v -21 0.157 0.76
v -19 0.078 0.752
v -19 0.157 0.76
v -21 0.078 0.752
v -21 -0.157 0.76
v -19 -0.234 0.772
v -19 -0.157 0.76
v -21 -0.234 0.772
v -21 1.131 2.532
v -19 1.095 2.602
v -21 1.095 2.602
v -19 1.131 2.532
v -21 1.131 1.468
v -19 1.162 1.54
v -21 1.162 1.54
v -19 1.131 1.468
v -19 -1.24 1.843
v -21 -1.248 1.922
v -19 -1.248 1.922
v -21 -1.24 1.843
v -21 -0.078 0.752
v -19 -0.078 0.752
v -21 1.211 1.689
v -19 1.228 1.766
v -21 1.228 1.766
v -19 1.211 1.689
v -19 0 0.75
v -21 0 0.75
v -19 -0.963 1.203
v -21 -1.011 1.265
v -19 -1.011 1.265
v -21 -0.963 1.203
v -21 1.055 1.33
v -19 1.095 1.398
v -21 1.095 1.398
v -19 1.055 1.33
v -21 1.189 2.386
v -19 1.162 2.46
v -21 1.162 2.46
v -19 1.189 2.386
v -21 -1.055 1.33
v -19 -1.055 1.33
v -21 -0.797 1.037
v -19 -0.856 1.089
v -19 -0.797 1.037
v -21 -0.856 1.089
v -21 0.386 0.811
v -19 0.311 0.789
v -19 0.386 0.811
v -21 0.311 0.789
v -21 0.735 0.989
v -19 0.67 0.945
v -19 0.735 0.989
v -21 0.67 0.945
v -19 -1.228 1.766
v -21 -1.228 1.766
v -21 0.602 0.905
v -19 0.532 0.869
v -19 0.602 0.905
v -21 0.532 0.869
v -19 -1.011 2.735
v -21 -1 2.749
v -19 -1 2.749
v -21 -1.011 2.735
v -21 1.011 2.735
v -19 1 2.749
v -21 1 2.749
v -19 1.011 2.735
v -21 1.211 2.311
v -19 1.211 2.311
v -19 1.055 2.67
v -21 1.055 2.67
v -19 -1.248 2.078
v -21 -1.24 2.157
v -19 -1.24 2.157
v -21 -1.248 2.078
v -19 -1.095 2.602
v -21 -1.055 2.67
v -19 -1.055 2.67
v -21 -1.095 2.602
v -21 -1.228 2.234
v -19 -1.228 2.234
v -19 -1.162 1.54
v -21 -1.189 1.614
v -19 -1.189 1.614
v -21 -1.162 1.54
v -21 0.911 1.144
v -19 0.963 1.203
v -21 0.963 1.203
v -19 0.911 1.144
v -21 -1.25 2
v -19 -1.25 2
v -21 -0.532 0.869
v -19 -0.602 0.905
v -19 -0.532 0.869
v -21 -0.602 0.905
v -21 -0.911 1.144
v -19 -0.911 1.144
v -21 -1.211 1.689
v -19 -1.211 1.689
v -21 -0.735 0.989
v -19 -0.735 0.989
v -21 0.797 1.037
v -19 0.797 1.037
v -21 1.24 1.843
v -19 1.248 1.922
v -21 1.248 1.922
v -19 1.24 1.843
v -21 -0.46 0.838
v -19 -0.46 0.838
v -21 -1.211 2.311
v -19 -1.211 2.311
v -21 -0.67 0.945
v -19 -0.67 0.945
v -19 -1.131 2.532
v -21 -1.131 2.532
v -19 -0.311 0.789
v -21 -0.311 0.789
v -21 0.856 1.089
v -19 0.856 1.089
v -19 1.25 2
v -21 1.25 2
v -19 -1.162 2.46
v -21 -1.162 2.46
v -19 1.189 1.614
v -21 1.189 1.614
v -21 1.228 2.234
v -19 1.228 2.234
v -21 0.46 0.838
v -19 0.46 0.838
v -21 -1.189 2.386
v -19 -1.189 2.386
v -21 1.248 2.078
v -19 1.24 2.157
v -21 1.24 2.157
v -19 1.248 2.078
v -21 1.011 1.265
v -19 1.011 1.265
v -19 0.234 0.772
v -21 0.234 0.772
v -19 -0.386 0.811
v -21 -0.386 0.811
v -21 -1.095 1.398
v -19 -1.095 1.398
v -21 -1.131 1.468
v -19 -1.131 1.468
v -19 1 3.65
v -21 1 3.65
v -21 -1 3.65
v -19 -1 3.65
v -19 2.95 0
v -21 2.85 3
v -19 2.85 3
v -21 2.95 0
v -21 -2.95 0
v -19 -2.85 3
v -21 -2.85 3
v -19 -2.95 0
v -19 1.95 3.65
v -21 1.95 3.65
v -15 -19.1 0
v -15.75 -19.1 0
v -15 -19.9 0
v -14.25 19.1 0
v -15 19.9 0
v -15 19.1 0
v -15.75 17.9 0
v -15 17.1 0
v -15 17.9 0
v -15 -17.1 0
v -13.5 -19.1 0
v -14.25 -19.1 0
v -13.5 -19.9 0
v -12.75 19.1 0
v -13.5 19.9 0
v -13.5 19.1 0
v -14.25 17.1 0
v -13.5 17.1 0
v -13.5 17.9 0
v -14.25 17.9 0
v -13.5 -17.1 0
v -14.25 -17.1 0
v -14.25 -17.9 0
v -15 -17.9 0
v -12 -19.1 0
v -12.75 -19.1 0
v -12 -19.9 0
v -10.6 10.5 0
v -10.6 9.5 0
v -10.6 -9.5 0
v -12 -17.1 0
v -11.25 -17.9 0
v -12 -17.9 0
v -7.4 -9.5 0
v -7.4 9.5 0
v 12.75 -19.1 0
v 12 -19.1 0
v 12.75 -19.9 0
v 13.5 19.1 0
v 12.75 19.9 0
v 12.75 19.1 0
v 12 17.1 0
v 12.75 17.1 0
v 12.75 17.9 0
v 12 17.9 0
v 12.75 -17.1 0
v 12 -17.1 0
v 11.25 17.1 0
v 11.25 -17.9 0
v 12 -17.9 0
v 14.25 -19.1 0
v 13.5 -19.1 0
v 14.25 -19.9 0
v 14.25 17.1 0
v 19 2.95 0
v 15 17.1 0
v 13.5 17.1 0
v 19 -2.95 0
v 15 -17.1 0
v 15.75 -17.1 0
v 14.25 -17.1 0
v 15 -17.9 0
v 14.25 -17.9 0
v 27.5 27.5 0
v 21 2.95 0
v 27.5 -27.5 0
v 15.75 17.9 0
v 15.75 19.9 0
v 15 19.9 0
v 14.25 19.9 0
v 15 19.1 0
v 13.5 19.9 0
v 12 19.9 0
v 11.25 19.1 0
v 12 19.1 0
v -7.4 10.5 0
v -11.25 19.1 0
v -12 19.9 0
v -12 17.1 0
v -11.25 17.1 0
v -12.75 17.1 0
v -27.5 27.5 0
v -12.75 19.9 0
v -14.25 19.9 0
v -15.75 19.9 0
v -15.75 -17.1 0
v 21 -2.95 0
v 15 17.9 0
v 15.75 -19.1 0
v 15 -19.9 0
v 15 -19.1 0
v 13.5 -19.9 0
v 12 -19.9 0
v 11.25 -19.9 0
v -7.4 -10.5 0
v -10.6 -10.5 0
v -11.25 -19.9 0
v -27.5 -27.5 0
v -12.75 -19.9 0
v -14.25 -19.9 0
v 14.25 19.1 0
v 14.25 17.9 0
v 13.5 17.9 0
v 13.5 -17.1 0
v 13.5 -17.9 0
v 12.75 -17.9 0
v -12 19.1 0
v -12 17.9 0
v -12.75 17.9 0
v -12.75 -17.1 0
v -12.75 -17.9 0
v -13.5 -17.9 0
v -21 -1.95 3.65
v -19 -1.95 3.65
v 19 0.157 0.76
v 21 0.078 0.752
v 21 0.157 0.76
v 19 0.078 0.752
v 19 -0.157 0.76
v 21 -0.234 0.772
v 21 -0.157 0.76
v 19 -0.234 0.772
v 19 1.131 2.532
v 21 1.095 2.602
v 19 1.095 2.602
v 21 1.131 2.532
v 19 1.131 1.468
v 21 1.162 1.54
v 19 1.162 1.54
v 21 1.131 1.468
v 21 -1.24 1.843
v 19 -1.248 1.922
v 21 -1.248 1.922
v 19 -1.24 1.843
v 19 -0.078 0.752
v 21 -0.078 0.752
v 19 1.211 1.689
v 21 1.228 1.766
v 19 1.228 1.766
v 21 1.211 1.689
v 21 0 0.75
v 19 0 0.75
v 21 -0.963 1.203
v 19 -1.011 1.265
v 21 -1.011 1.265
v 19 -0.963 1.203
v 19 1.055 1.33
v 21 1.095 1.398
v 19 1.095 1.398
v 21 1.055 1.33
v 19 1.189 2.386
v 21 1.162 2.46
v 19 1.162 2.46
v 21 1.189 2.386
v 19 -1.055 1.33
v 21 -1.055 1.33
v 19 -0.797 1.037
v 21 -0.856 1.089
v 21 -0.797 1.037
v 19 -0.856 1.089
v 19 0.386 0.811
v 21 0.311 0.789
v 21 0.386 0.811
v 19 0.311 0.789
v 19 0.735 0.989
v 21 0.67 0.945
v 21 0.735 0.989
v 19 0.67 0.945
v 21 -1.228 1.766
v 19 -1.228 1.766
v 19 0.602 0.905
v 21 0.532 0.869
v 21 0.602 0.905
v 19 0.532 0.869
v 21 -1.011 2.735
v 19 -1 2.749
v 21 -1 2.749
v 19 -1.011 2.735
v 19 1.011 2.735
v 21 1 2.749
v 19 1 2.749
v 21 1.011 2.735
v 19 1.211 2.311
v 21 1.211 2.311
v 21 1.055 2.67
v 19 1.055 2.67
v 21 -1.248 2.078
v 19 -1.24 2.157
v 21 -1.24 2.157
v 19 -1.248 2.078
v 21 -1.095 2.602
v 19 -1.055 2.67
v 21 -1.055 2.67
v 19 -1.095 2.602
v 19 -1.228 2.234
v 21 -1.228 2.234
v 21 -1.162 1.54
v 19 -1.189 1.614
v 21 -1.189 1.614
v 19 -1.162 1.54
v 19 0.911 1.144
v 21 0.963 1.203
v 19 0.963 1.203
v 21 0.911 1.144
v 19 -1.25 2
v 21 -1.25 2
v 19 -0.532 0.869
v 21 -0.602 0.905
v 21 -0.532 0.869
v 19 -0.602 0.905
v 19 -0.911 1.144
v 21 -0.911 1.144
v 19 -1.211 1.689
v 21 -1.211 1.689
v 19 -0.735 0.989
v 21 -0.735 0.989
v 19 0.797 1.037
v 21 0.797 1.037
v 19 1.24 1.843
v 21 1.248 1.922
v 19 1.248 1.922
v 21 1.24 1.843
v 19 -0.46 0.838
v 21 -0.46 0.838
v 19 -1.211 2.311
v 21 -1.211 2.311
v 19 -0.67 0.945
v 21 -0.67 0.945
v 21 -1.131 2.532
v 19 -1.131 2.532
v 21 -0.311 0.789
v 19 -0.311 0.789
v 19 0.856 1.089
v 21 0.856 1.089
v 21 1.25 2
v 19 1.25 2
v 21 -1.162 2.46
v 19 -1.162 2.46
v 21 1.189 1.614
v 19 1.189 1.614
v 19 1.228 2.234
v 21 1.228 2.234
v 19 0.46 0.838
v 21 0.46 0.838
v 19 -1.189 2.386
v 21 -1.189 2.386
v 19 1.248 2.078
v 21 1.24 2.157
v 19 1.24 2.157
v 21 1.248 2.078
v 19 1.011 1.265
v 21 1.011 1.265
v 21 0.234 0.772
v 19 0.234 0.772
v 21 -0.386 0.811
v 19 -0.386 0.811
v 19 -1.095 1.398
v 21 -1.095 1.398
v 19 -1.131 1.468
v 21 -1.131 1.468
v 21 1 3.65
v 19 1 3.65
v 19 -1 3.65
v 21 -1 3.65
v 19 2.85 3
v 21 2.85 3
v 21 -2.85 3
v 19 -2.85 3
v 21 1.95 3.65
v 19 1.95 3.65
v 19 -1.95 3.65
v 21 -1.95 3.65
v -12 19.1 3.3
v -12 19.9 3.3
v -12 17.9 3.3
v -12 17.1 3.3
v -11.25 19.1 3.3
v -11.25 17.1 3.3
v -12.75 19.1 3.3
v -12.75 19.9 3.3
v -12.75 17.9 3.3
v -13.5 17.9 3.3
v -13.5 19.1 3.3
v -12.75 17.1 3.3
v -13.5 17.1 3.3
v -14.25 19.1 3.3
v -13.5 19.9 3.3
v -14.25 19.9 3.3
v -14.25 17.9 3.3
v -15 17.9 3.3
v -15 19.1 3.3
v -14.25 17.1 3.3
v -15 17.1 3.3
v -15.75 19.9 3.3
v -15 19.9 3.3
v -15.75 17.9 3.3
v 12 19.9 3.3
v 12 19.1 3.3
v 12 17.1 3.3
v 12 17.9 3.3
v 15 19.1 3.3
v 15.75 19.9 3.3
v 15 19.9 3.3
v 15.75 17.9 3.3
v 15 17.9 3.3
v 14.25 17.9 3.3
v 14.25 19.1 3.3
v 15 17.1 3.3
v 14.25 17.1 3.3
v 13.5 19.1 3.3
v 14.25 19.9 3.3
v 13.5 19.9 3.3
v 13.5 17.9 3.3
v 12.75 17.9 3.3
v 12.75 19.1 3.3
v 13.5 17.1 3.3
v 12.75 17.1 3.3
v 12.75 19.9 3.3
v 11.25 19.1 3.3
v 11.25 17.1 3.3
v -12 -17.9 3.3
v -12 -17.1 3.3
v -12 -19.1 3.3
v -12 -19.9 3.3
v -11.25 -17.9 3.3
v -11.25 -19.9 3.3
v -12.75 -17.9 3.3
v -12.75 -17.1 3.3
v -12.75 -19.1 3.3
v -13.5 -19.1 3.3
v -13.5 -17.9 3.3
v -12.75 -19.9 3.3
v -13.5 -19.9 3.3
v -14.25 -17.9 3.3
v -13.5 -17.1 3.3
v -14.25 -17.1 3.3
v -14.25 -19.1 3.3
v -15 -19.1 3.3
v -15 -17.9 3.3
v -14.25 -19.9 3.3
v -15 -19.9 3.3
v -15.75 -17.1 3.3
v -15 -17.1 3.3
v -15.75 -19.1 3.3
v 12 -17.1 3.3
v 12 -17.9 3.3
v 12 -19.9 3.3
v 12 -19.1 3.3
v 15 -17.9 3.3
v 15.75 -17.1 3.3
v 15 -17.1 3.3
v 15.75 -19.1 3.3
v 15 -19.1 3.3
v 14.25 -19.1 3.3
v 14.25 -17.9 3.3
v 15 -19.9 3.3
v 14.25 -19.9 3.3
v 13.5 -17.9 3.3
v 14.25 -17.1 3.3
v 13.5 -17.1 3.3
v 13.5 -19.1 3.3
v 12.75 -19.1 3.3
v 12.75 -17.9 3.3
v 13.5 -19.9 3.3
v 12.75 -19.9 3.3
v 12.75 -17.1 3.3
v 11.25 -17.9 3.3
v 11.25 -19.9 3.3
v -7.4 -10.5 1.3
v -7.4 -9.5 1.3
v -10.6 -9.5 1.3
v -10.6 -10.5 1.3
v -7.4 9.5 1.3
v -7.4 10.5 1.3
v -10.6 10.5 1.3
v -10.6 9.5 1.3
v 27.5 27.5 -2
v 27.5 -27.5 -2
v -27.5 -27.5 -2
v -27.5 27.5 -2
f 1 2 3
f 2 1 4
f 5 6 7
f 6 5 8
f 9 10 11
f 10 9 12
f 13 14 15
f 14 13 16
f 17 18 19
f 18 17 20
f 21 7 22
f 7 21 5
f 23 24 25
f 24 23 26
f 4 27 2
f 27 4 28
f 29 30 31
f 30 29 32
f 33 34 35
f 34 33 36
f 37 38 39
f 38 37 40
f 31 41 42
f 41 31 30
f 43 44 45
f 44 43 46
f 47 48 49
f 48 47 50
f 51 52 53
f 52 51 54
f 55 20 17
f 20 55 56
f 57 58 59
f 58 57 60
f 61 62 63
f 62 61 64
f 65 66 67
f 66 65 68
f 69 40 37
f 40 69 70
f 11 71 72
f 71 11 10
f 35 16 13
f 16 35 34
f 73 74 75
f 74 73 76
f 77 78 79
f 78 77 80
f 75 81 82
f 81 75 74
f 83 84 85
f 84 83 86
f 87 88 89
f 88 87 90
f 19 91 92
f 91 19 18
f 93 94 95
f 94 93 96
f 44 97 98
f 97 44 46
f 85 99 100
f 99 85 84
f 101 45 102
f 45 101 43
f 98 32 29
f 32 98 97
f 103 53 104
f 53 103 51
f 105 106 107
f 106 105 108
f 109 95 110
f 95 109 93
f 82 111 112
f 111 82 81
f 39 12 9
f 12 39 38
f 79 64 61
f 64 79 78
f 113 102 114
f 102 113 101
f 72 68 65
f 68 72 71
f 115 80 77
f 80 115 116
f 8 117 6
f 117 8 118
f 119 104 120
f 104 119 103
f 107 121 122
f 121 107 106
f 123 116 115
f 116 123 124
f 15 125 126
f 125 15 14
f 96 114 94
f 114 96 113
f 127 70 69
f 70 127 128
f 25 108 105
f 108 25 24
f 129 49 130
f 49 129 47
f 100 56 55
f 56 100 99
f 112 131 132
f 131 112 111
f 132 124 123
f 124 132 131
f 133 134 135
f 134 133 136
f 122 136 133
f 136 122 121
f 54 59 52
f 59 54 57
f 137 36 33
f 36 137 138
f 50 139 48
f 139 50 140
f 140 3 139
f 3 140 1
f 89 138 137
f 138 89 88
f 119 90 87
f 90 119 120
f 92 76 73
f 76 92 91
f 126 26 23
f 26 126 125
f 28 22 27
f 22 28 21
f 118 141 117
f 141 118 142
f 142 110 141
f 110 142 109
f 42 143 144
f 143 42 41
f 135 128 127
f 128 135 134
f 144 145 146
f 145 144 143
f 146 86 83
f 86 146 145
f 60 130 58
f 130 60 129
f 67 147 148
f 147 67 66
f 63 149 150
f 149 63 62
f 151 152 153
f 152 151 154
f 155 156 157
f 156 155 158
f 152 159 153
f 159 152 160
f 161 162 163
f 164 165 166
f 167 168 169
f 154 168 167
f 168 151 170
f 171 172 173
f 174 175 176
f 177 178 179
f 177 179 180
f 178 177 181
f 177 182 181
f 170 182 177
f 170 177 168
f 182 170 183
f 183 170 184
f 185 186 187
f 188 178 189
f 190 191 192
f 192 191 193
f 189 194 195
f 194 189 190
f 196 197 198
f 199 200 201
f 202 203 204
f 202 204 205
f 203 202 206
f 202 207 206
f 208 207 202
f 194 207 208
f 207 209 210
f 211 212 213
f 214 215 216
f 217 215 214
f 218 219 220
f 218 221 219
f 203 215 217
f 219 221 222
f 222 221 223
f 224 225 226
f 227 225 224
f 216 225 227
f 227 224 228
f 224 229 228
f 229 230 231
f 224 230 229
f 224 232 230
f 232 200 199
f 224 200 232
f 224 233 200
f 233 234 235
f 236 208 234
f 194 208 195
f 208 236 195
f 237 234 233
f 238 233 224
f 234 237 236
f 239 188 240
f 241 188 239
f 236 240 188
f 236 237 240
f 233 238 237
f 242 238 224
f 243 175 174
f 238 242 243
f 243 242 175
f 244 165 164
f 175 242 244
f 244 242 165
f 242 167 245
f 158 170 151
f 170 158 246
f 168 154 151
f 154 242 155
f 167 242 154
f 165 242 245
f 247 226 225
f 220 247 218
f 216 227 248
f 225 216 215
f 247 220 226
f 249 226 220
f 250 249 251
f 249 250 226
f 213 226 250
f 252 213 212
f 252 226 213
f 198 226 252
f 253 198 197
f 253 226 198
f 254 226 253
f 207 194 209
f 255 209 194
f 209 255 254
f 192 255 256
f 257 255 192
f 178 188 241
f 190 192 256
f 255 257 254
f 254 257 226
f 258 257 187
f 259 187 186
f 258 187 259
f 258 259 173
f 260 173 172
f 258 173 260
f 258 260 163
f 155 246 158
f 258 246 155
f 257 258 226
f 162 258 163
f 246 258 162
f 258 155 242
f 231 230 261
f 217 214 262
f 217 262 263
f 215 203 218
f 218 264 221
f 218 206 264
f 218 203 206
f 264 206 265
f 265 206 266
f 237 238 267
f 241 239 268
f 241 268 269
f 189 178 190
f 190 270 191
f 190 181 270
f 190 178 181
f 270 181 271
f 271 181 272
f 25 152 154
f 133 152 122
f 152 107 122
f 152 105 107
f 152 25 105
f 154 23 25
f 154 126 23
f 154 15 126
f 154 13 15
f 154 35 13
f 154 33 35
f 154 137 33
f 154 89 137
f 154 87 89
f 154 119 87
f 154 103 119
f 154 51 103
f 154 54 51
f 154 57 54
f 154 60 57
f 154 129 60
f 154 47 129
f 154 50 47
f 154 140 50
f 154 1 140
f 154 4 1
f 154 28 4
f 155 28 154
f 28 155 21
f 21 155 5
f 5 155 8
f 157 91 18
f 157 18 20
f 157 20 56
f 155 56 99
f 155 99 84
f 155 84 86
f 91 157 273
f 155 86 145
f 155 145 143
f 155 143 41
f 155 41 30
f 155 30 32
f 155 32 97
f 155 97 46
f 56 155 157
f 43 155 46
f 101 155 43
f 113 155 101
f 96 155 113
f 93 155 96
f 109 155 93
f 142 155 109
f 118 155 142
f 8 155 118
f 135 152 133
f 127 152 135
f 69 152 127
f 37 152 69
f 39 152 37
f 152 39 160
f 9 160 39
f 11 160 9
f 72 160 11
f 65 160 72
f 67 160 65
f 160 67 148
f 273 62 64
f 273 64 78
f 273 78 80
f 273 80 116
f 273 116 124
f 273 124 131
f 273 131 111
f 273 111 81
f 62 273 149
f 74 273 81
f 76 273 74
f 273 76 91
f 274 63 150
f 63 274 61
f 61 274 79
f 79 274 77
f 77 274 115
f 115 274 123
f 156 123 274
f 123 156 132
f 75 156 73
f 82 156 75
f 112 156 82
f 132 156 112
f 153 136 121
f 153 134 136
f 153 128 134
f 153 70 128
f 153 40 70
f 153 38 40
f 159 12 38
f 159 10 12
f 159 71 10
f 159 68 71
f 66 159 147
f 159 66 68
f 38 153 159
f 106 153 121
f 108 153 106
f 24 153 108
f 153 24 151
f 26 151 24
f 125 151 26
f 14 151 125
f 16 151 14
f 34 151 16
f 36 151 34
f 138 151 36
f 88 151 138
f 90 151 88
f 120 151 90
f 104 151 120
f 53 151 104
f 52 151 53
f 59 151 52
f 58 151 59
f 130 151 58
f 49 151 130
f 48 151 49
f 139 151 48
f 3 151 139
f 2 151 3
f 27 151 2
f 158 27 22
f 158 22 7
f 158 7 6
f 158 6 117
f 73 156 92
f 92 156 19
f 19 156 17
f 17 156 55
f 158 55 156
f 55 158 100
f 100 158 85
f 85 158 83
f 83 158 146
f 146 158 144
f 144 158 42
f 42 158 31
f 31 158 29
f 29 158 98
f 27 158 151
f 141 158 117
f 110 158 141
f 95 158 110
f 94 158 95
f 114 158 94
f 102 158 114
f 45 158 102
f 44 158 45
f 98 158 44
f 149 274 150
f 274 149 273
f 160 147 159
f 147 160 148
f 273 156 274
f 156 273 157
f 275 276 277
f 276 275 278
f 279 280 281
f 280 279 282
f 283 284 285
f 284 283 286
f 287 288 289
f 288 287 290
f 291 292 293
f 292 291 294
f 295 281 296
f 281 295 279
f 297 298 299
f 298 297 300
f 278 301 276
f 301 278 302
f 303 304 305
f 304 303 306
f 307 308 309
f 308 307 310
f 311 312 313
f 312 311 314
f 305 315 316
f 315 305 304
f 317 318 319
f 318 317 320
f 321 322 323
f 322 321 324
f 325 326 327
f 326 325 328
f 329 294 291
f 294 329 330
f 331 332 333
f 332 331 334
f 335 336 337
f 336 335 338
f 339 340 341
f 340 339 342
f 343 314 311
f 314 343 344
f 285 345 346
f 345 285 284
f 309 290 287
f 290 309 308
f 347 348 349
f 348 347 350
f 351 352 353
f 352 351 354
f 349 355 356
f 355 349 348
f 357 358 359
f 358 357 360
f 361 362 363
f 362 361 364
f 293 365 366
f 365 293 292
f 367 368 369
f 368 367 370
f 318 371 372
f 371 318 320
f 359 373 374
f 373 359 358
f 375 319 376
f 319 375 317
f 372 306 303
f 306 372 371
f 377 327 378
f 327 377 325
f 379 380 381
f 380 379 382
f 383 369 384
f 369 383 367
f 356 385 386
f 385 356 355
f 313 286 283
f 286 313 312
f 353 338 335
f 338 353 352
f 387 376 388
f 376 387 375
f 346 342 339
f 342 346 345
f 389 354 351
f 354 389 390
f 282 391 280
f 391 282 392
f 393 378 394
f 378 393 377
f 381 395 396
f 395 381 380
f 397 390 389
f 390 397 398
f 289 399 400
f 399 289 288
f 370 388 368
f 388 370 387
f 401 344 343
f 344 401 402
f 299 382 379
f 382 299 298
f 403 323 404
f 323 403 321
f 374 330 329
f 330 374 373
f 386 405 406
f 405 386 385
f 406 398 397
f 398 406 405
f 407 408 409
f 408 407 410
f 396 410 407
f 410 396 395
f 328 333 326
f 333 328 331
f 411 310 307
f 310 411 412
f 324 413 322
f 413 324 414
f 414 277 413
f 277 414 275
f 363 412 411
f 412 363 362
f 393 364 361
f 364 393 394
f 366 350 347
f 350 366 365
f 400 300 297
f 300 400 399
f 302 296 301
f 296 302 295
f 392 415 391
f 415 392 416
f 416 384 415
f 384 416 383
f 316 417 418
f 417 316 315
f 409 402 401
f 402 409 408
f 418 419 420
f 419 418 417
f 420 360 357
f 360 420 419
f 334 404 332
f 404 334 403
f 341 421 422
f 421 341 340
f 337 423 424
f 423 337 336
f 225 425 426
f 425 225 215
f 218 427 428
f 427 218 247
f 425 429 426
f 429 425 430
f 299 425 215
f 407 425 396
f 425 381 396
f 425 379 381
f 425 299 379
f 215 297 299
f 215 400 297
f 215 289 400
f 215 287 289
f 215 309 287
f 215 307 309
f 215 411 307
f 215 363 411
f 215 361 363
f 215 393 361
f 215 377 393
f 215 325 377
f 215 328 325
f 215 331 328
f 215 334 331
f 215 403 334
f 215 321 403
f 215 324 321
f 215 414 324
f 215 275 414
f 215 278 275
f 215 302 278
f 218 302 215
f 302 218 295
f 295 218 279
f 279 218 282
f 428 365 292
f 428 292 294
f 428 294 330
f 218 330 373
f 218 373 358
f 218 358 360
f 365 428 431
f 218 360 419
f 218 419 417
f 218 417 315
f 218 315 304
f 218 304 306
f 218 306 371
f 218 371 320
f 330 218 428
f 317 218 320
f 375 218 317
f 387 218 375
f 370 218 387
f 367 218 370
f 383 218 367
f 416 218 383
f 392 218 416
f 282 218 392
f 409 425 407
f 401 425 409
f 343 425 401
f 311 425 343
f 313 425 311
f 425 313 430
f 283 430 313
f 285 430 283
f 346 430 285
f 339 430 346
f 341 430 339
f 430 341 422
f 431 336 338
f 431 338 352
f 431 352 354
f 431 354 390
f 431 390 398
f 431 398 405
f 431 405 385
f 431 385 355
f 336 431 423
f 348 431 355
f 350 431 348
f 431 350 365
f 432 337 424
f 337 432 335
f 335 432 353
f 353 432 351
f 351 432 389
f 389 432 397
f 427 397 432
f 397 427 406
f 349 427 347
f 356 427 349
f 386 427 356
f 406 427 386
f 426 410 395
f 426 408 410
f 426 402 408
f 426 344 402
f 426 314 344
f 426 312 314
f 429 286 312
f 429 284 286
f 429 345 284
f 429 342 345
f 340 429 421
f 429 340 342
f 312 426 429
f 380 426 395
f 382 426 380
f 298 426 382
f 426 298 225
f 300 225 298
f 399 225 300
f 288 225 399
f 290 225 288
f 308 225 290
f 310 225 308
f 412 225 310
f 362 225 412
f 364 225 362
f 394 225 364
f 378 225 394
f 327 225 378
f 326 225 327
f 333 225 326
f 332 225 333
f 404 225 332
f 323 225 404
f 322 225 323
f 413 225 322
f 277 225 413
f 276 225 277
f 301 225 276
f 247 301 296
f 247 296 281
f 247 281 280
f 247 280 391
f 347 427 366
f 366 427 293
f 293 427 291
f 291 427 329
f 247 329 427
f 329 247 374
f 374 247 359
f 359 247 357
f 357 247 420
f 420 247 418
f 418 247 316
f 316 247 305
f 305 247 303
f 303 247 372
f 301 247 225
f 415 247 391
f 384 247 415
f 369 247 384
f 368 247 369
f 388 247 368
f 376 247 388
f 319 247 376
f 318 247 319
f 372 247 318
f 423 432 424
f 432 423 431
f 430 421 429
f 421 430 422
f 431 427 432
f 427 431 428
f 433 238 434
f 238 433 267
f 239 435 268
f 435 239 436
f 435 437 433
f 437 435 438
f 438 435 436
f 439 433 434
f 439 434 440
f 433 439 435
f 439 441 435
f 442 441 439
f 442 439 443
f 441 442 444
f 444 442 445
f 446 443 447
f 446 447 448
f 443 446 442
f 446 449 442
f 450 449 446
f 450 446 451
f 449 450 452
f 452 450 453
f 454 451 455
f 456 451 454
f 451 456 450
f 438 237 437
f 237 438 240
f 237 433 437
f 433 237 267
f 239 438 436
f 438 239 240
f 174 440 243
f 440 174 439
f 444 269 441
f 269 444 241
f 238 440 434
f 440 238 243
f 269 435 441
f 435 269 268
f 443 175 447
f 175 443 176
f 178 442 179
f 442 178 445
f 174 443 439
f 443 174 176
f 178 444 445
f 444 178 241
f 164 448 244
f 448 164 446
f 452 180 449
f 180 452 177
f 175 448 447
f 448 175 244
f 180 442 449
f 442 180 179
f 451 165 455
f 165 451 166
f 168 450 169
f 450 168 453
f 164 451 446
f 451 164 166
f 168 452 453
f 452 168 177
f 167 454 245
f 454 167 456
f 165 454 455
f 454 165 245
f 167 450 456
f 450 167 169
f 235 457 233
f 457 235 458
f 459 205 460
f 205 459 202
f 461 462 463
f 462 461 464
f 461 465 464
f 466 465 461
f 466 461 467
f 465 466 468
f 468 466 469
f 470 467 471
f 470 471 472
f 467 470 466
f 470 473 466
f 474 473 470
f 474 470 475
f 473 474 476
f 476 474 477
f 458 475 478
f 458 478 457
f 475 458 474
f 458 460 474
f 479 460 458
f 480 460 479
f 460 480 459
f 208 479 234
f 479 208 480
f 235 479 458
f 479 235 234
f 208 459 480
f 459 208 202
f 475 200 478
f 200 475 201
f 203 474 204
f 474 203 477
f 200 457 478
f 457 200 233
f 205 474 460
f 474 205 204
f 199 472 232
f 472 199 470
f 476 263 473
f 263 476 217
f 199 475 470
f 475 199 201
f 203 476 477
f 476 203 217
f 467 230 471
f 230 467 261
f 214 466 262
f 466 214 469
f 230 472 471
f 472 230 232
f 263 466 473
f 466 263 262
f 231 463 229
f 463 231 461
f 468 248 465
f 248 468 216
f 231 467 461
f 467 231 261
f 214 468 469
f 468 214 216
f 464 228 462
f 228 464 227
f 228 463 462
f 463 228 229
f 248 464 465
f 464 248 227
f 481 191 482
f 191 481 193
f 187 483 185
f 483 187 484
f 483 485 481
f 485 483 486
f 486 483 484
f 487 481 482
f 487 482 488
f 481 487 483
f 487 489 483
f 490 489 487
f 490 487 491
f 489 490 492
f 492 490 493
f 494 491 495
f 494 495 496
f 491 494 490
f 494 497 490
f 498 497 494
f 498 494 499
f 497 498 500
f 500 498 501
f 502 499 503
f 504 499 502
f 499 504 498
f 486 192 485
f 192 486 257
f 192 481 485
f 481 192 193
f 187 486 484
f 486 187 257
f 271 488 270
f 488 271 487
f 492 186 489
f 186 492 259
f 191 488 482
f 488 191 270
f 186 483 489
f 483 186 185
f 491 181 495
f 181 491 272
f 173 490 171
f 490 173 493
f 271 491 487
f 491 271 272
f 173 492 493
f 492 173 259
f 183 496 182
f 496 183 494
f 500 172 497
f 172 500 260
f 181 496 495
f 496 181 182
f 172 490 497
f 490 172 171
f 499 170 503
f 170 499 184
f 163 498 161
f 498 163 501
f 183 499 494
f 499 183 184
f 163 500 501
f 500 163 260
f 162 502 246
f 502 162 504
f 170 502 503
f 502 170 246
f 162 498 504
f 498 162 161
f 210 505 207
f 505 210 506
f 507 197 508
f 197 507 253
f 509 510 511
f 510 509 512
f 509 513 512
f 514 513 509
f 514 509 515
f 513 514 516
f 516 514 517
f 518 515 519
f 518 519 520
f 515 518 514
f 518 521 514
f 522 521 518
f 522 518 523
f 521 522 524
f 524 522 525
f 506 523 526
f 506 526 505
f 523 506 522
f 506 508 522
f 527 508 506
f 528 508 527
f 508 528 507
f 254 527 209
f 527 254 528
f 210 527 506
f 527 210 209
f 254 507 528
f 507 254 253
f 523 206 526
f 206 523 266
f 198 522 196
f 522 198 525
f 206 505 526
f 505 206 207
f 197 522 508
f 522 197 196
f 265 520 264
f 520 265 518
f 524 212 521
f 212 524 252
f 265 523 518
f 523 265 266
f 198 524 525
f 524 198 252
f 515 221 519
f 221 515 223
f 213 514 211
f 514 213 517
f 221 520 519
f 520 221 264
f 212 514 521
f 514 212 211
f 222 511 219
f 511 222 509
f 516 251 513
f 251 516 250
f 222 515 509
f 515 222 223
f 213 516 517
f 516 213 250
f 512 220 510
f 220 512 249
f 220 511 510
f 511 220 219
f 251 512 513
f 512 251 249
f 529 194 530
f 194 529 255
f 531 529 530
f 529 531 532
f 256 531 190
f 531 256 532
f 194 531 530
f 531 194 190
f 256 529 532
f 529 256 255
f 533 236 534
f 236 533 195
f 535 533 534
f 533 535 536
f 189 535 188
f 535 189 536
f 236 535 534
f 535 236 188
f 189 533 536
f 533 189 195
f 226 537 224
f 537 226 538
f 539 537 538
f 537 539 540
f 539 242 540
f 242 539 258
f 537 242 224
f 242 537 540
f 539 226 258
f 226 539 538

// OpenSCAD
$fn = 100; // render resolution

// parameters
bottom = 54;
top = 55;
h = 8.7;
border = 1.5;
bottom_thickness = 2; // new floor thickness

// computed inner sizes
inner_bottom = bottom - 2*border;
inner_top    = top    - 2*border;

// sanity check
if (inner_bottom <= 0 || inner_top <= 0)
    echo("ERROR: border too large for given dimensions");

module tapered_square(bottom_size, top_size, height) {
    hull() {
        translate([-bottom_size/2, -bottom_size/2, 0])
            cube([bottom_size, bottom_size, 0.01]);
        translate([-top_size/2, -top_size/2, height])
            cube([top_size, top_size, 0.01]);
    }
}

module case() {
    difference() {
        // outer tapered shell
        tapered_square(bottom, top, h);

        // inner hollow space (shifted up so bottom stays solid)
        translate([0, 0, bottom_thickness])
            tapered_square(inner_bottom, inner_top, h - bottom_thickness);
    }

    // add solid bottom plate
    translate([-inner_bottom/2, -inner_bottom/2, 0])
        cube([inner_bottom, inner_bottom, bottom_thickness]);
}

// case();

//linear_extrude(height=depth + previewOptimize * 2, center=false) {

module clip(width=2, length=5.9) {
    rotate([0,-90,0])
    difference() {
        linear_extrude(width) // 1.5 would be ideal but I guess it is too thing to provide the structural integrity
            polygon(points=[
                    [0, 0],
                    [0, length],
                    [3, length-.1],
                    [3.65, length - 1],

                    [3.65, 1],
                    [3, 0.1],
                ]);

        union() {
            translate([2,length/2,-5])
                cylinder(d=2.5, h=10, center=false, $fn=100); // d3 is too much

            translate([2,length/2 - 2/2,-5])
                cube([2,2,10], center=false);
        }
    }
}

module clips(width=2, length=5.9, distance=38) { // 40 (37.5)
    d = distance + width;
    translate([-d/2 + width/2,-length/2,0]) {
        clip(width=width, length=length);
        translate([d,0,0])
            clip(width=width, length=length);
    }
}


module button() {
    union() {
        for (i = [0:5]) {
            translate([0.75 * i, (i % 2) * 0.8, 0])
                cube([0.75, 2, 3.3]);
        }
    }
}

module buttons(distance=22.5) {
    width = 4.5;
    d = distance + width;

    translate([-d/2 + width/2,-2.8/2]) {
        mirror([1,0,0])
            button();

        translate([22.5,0,0])
            button();
    }
}

module button_slim() {
    cube([3.2, 1, 1.3]);
}

module buttons_slim() {
    translate([-3.2/2,-1/2 - 20/2,0]) {
        button_slim();

        translate([0,20,0])
            button_slim();
    }
}

//case();

translate([0,0,-1])
    cube([55,55,2], center=true);

clips();

translate([0,18.5,0])
buttons();

translate([0,-18.5,0])
    buttons();

translate([-55/2 + 18.5,0,0])
buttons_slim();
